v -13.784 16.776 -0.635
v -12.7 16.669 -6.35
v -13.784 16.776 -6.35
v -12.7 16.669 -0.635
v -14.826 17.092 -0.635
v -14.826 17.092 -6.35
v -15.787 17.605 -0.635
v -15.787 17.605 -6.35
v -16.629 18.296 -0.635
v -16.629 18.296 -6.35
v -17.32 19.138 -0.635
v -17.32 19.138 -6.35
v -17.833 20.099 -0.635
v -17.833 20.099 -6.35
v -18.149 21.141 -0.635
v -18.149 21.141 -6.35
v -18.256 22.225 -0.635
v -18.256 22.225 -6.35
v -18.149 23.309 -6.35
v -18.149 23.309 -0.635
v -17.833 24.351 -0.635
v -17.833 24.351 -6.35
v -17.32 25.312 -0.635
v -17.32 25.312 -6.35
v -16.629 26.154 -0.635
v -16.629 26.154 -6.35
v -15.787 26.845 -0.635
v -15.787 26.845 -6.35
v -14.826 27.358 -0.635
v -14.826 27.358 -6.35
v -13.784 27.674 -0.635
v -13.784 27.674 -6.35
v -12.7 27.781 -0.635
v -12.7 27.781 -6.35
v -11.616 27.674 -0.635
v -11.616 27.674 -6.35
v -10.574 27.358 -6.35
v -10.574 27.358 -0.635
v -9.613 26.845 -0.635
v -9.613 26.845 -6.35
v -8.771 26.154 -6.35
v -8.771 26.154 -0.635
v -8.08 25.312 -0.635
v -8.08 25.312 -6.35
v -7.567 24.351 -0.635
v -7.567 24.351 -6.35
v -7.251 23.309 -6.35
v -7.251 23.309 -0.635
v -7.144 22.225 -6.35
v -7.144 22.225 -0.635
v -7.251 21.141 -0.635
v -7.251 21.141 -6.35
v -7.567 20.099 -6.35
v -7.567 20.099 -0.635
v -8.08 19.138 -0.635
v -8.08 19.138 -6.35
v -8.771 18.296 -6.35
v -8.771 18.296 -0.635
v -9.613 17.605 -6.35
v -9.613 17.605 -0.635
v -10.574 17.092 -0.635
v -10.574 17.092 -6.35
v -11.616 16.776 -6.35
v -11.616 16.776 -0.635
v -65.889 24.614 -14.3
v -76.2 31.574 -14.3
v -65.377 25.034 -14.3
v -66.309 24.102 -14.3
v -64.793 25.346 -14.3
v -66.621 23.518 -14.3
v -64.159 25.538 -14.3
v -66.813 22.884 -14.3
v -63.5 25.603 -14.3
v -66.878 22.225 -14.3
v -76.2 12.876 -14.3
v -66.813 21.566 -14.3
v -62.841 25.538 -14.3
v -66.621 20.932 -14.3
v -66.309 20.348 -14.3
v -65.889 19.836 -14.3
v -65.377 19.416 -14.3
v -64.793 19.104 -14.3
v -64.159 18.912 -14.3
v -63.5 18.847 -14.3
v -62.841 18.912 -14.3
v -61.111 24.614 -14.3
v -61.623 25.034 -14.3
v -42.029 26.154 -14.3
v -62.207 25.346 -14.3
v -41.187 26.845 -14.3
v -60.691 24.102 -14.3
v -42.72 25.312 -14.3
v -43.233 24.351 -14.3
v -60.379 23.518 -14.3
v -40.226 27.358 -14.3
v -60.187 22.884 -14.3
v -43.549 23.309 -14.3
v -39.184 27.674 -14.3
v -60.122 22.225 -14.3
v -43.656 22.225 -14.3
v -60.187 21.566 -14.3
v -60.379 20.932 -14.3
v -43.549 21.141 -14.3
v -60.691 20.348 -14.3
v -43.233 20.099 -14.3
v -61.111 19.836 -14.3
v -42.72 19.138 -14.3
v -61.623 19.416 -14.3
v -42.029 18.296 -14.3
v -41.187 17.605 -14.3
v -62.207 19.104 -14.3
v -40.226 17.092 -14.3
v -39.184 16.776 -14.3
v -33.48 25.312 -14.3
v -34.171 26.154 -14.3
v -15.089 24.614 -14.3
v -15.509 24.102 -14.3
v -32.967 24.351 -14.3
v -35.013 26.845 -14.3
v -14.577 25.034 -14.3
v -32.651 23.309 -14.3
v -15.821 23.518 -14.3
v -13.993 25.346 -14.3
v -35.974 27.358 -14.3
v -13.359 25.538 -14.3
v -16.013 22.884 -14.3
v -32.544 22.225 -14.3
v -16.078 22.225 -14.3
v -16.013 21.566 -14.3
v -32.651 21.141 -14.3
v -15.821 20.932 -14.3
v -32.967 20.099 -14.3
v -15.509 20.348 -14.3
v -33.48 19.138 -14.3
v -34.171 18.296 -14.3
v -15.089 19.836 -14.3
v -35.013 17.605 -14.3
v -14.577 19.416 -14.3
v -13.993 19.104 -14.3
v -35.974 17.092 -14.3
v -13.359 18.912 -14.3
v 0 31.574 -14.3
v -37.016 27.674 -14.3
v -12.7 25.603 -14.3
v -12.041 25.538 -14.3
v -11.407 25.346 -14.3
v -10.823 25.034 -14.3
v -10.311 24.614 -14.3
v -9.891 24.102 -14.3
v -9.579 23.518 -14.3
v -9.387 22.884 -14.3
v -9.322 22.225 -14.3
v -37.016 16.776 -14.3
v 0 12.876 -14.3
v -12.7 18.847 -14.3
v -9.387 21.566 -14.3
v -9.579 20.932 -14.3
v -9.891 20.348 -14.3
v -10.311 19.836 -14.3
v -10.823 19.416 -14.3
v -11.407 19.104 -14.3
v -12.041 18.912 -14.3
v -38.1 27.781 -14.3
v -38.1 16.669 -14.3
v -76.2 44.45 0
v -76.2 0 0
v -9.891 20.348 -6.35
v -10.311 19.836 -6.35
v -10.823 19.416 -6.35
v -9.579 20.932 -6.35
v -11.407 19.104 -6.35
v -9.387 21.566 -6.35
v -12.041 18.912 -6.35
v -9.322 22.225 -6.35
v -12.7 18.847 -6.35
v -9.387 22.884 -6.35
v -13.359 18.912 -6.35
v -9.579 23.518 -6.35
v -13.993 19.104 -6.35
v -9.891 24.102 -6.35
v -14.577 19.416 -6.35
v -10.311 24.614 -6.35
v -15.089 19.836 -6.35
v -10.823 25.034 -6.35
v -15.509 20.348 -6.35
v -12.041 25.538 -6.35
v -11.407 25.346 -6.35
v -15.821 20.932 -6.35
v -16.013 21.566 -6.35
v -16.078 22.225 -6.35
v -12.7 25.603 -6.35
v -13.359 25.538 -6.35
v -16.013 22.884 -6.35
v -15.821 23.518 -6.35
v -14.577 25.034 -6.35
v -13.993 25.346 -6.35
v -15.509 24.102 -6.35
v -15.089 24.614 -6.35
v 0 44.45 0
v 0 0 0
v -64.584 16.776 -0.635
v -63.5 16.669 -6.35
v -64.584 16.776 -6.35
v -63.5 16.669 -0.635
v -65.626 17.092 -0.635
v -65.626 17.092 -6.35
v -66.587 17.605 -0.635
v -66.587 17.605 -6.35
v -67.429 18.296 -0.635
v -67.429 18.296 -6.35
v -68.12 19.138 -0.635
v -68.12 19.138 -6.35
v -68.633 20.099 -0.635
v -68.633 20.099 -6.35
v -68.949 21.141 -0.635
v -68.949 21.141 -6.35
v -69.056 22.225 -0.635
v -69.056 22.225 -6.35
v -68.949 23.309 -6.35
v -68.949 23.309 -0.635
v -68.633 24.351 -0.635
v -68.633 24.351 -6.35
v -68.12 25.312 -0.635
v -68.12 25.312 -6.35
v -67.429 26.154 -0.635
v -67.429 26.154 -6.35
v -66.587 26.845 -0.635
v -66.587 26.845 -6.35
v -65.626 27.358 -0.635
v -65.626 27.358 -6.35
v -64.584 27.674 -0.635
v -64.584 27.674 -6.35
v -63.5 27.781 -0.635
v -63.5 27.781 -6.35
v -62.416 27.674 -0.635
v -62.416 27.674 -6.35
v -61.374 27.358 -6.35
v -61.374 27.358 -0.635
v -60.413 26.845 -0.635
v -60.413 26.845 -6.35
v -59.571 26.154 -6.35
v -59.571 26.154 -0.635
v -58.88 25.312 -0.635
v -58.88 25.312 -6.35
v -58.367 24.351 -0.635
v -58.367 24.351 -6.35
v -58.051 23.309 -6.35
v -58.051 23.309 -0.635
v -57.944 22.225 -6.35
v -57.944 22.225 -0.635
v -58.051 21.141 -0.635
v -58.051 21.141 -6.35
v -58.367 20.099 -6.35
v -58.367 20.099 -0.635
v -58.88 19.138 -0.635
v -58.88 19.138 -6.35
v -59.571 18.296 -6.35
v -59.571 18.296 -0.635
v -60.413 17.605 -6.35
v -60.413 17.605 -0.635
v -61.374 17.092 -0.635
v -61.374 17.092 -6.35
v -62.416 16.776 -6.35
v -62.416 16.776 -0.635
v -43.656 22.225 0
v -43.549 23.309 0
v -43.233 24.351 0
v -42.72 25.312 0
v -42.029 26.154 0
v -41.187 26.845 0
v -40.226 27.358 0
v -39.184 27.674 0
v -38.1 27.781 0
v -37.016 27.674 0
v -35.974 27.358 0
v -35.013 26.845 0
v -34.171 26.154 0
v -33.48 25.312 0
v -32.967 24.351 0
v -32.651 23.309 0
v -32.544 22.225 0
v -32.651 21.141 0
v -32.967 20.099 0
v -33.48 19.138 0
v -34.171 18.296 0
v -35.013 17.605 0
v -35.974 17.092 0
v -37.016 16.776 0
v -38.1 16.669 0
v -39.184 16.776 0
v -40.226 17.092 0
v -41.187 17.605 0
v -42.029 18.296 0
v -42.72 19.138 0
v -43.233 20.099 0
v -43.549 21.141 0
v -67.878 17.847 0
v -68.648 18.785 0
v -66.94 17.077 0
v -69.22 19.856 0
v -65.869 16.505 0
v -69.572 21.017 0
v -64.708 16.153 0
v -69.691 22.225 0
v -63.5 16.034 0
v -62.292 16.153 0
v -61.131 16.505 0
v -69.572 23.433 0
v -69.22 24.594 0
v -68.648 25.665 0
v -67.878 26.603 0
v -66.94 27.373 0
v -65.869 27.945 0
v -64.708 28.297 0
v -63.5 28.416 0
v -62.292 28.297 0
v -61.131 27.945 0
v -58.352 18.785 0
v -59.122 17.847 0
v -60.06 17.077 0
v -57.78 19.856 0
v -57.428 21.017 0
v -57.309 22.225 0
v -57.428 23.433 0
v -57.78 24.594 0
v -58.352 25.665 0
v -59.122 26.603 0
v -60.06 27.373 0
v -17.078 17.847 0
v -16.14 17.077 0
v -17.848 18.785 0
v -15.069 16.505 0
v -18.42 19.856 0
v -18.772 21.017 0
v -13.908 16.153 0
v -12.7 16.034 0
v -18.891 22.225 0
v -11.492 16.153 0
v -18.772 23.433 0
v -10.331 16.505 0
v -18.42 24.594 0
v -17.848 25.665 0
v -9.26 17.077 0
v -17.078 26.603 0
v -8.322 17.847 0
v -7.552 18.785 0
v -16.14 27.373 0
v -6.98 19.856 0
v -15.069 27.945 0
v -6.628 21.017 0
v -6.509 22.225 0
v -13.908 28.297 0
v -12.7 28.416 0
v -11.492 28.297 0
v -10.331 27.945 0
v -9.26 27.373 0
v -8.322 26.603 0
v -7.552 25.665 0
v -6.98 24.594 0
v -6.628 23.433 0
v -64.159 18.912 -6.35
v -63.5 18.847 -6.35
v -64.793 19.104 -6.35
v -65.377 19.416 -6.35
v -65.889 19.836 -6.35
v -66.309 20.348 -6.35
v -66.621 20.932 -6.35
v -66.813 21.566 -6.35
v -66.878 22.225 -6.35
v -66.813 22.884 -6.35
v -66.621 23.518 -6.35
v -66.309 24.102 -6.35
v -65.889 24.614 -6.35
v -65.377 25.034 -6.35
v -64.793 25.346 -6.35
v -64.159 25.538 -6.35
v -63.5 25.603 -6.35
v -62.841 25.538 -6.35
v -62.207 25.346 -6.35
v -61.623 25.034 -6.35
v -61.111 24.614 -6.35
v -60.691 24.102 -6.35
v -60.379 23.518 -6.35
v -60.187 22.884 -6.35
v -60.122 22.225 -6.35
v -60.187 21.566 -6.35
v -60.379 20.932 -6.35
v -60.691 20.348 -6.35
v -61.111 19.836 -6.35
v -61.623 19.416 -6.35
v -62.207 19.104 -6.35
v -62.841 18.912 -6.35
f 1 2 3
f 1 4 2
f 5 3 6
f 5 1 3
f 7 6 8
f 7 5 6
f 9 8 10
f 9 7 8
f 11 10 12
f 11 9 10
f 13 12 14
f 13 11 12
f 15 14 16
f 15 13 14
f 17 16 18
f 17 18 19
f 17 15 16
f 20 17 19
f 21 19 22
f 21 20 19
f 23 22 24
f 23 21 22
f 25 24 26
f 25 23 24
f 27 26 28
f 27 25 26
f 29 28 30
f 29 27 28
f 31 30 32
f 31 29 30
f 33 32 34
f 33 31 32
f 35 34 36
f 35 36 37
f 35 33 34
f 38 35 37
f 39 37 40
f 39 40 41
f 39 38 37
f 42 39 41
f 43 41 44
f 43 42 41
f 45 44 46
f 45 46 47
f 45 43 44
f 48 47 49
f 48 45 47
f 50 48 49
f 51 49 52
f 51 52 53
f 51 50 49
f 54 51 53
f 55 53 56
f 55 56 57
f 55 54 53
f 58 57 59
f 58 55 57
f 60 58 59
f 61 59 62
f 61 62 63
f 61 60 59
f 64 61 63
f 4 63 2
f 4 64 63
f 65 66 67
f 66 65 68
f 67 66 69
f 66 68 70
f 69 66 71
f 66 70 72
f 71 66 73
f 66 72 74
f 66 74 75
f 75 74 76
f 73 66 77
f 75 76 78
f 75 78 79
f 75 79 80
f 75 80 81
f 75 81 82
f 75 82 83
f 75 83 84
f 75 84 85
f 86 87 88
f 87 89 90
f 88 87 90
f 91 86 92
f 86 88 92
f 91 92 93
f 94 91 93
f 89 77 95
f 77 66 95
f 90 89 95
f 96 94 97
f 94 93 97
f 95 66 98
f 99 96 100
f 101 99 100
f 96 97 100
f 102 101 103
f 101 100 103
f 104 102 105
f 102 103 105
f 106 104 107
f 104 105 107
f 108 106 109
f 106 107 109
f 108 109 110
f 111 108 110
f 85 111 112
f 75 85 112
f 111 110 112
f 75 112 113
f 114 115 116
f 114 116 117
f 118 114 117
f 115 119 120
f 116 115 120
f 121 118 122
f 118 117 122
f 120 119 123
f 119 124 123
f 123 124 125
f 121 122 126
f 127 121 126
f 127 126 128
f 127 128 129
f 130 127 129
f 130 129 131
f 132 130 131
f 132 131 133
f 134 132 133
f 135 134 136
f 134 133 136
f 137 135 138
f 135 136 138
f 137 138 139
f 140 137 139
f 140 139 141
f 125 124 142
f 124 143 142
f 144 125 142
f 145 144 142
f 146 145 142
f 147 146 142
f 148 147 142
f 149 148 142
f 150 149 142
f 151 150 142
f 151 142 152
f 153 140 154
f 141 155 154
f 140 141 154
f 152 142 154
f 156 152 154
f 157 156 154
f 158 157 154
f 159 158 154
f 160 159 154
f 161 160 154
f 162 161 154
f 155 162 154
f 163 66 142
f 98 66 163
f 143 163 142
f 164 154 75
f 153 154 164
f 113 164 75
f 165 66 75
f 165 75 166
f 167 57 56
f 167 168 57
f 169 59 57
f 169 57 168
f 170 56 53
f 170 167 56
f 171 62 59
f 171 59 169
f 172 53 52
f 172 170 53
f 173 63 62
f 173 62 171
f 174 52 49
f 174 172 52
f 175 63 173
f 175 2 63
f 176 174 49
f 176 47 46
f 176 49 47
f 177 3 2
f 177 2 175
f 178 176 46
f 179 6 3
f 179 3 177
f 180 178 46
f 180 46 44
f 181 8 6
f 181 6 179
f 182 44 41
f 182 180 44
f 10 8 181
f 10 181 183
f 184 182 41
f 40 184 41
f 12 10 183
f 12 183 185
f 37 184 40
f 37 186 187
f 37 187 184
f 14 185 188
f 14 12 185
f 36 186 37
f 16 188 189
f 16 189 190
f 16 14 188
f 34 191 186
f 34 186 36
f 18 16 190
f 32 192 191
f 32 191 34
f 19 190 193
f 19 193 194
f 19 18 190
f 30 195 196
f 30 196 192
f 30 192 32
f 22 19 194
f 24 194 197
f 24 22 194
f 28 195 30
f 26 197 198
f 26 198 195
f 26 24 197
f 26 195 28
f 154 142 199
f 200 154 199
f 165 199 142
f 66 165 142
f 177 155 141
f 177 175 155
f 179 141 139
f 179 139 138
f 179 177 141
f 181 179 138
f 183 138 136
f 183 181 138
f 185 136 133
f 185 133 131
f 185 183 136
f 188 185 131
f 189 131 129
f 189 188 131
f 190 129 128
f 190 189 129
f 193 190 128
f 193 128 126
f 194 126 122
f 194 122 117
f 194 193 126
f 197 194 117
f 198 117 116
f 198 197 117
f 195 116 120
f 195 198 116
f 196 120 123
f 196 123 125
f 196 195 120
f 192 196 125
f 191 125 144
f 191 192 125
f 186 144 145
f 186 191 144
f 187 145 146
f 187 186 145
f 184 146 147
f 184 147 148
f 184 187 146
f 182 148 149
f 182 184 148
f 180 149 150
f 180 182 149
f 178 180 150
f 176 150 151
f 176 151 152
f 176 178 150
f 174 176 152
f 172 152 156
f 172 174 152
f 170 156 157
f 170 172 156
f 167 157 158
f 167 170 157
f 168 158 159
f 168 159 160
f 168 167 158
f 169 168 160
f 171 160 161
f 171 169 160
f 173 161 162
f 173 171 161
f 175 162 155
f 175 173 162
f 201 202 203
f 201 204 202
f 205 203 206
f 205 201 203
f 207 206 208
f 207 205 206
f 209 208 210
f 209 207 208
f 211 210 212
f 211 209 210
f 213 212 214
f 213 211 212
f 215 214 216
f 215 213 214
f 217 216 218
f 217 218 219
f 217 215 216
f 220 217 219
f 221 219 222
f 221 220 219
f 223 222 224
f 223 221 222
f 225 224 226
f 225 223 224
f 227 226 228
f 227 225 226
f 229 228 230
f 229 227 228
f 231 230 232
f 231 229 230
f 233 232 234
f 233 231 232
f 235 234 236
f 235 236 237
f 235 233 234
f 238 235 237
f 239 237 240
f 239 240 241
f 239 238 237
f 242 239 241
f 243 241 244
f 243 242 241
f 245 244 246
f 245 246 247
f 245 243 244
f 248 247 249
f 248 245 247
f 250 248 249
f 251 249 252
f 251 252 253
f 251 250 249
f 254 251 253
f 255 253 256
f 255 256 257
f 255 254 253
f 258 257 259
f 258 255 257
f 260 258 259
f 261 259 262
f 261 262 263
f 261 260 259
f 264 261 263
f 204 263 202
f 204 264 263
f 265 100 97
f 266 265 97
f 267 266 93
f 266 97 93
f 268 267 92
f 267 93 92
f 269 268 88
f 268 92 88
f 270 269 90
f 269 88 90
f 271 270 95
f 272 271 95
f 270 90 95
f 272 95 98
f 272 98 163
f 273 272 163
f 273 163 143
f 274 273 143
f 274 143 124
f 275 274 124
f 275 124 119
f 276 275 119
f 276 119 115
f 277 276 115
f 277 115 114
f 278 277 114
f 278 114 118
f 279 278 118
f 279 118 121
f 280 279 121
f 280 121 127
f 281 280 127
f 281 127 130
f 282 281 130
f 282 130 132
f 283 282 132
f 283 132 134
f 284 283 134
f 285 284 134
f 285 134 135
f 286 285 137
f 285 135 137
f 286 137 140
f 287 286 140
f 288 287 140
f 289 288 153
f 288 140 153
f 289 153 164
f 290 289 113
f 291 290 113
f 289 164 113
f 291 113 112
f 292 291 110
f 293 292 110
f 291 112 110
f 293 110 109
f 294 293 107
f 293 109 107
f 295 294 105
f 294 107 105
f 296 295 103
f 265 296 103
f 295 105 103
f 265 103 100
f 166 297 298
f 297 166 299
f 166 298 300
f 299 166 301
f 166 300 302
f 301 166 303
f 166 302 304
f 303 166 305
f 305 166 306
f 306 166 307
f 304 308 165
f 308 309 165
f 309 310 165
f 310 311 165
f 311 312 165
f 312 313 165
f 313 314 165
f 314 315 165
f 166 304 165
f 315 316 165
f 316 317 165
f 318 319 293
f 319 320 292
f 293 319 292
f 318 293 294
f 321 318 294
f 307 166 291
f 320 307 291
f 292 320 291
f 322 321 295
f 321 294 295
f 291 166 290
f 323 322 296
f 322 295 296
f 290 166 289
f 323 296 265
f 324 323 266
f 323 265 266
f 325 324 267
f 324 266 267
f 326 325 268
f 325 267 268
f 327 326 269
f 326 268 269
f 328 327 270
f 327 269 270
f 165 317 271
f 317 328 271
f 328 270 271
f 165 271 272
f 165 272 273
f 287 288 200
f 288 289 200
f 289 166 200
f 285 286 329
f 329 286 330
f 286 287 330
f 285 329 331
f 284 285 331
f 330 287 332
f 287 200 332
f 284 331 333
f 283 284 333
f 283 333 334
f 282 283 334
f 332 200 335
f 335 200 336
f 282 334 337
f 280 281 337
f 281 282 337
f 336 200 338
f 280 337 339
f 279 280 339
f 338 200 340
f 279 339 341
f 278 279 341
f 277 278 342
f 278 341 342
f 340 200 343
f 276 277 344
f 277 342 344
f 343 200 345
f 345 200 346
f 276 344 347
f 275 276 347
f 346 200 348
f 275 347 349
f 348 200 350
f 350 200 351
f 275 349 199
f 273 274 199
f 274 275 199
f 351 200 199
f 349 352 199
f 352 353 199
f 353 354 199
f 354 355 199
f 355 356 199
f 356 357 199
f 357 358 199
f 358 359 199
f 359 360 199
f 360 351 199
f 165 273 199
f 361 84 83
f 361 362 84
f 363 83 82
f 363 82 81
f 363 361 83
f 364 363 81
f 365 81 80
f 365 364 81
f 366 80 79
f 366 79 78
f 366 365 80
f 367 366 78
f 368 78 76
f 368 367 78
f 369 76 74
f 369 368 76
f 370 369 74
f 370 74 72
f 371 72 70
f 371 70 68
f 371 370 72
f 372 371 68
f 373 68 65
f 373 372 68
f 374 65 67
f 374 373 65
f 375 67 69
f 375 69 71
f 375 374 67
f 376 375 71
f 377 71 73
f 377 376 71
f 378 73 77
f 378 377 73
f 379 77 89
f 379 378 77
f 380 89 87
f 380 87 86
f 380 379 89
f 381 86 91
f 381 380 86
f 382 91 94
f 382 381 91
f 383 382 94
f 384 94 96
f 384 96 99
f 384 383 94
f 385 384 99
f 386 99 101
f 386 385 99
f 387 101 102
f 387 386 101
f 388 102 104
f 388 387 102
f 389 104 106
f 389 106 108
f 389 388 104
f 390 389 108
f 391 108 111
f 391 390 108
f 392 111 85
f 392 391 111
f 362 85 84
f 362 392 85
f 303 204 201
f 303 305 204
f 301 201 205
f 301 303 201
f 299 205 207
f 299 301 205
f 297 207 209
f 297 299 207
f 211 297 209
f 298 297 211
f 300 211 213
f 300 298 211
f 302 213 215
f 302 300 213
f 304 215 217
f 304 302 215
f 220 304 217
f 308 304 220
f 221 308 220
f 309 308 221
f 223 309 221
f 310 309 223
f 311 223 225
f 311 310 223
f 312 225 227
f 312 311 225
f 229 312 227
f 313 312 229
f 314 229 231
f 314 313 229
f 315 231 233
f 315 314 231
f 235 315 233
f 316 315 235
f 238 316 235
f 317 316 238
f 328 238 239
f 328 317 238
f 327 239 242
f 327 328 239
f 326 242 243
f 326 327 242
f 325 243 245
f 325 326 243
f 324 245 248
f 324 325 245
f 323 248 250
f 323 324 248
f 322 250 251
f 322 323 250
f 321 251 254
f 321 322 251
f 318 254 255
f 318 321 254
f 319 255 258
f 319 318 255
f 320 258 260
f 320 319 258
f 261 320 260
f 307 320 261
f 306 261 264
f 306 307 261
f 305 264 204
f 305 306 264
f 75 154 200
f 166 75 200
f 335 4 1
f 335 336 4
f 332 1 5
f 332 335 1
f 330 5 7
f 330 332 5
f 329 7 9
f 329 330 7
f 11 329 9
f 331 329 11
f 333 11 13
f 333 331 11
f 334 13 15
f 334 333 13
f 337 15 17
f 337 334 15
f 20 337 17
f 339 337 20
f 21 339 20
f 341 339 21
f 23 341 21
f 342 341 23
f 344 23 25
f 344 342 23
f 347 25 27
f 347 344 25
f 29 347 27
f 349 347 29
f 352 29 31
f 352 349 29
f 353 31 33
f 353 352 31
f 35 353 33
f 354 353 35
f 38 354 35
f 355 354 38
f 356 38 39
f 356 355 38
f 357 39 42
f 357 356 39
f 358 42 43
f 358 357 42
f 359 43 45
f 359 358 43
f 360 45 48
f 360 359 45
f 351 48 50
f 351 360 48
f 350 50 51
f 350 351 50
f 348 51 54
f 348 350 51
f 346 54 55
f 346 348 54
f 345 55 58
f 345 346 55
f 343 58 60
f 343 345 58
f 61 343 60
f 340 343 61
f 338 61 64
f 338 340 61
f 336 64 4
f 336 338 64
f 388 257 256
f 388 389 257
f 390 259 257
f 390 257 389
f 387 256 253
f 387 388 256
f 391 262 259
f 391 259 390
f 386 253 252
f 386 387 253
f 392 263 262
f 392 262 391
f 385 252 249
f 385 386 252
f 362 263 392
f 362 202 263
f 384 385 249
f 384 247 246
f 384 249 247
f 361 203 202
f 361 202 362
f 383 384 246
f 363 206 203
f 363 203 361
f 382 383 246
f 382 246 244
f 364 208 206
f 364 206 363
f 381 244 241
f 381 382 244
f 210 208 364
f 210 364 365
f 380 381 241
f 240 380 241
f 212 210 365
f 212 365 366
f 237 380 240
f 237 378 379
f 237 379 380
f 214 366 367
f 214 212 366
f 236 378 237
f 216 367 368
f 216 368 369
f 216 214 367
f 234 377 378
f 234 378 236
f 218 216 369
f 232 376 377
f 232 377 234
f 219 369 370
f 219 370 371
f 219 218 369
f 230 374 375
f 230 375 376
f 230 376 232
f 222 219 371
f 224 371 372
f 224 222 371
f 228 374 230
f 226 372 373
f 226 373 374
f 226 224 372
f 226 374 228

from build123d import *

# Parameters (mm, degrees)
BOSS_EXTRUDE1_DEPTH                           = 76.2
CBORE_FOR_1_4_SOCKET_HEAD_CAP_SCREW1_AT_COUNT = 2
CBORE_FOR_1_4_SOCKET_HEAD_CAP_SCREW1_AT_PITCH = 50.8
F_7_16_0_4375_DIAMETER_HOLE1_D                = 11.1125


with BuildPart() as part:
    # Sketch2 → Boss-Extrude1 (new body)
    with BuildSketch(Plane(origin=(0, 0, 0), x_dir=(0, 0, -1), z_dir=(1, 0, 0))):
        Polygon((0, 0), (0, 44.45), (14.3002, 31.574042086), (14.3002, 12.875957914), align=None)
    extrude(amount=-BOSS_EXTRUDE1_DEPTH)

    # Sketch3 → CBORE for 1/4 Socket Head Cap Screw1 (revolve, cut)
    with BuildSketch(Plane(origin=(-63.5, 22.225, 0), x_dir=(0, -1, 0), z_dir=(1, 0, 0))):
        Polygon((0, 0), (0, 14.3002), (3.3782, 14.3002), (3.3782, 6.35), (5.55625, 6.35), (5.55625, 0.635), (6.19125, 0), align=None)
    cbore_for_1_4_socket_head_cap_screw1 = revolve(axis=Axis((-63.5, 22.225, 6.35), (0, 0, -1)), mode=Mode.SUBTRACT)

    # CBORE for 1/4 Socket Head Cap Screw1 at: CBORE for 1/4 Socket Head Cap Screw1 ×2
    with Locations(*[(i * CBORE_FOR_1_4_SOCKET_HEAD_CAP_SCREW1_AT_PITCH, 0, 0) for i in range(1, CBORE_FOR_1_4_SOCKET_HEAD_CAP_SCREW1_AT_COUNT)]):
        add(cbore_for_1_4_socket_head_cap_screw1, mode=Mode.SUBTRACT)

    # 7/16 (0.4375) Diameter Hole1 (through all)
    with Locations(Plane.XY):
        with Locations((-38.1, 22.225)):
            Hole(F_7_16_0_4375_DIAMETER_HOLE1_D / 2)


solid = part.part
